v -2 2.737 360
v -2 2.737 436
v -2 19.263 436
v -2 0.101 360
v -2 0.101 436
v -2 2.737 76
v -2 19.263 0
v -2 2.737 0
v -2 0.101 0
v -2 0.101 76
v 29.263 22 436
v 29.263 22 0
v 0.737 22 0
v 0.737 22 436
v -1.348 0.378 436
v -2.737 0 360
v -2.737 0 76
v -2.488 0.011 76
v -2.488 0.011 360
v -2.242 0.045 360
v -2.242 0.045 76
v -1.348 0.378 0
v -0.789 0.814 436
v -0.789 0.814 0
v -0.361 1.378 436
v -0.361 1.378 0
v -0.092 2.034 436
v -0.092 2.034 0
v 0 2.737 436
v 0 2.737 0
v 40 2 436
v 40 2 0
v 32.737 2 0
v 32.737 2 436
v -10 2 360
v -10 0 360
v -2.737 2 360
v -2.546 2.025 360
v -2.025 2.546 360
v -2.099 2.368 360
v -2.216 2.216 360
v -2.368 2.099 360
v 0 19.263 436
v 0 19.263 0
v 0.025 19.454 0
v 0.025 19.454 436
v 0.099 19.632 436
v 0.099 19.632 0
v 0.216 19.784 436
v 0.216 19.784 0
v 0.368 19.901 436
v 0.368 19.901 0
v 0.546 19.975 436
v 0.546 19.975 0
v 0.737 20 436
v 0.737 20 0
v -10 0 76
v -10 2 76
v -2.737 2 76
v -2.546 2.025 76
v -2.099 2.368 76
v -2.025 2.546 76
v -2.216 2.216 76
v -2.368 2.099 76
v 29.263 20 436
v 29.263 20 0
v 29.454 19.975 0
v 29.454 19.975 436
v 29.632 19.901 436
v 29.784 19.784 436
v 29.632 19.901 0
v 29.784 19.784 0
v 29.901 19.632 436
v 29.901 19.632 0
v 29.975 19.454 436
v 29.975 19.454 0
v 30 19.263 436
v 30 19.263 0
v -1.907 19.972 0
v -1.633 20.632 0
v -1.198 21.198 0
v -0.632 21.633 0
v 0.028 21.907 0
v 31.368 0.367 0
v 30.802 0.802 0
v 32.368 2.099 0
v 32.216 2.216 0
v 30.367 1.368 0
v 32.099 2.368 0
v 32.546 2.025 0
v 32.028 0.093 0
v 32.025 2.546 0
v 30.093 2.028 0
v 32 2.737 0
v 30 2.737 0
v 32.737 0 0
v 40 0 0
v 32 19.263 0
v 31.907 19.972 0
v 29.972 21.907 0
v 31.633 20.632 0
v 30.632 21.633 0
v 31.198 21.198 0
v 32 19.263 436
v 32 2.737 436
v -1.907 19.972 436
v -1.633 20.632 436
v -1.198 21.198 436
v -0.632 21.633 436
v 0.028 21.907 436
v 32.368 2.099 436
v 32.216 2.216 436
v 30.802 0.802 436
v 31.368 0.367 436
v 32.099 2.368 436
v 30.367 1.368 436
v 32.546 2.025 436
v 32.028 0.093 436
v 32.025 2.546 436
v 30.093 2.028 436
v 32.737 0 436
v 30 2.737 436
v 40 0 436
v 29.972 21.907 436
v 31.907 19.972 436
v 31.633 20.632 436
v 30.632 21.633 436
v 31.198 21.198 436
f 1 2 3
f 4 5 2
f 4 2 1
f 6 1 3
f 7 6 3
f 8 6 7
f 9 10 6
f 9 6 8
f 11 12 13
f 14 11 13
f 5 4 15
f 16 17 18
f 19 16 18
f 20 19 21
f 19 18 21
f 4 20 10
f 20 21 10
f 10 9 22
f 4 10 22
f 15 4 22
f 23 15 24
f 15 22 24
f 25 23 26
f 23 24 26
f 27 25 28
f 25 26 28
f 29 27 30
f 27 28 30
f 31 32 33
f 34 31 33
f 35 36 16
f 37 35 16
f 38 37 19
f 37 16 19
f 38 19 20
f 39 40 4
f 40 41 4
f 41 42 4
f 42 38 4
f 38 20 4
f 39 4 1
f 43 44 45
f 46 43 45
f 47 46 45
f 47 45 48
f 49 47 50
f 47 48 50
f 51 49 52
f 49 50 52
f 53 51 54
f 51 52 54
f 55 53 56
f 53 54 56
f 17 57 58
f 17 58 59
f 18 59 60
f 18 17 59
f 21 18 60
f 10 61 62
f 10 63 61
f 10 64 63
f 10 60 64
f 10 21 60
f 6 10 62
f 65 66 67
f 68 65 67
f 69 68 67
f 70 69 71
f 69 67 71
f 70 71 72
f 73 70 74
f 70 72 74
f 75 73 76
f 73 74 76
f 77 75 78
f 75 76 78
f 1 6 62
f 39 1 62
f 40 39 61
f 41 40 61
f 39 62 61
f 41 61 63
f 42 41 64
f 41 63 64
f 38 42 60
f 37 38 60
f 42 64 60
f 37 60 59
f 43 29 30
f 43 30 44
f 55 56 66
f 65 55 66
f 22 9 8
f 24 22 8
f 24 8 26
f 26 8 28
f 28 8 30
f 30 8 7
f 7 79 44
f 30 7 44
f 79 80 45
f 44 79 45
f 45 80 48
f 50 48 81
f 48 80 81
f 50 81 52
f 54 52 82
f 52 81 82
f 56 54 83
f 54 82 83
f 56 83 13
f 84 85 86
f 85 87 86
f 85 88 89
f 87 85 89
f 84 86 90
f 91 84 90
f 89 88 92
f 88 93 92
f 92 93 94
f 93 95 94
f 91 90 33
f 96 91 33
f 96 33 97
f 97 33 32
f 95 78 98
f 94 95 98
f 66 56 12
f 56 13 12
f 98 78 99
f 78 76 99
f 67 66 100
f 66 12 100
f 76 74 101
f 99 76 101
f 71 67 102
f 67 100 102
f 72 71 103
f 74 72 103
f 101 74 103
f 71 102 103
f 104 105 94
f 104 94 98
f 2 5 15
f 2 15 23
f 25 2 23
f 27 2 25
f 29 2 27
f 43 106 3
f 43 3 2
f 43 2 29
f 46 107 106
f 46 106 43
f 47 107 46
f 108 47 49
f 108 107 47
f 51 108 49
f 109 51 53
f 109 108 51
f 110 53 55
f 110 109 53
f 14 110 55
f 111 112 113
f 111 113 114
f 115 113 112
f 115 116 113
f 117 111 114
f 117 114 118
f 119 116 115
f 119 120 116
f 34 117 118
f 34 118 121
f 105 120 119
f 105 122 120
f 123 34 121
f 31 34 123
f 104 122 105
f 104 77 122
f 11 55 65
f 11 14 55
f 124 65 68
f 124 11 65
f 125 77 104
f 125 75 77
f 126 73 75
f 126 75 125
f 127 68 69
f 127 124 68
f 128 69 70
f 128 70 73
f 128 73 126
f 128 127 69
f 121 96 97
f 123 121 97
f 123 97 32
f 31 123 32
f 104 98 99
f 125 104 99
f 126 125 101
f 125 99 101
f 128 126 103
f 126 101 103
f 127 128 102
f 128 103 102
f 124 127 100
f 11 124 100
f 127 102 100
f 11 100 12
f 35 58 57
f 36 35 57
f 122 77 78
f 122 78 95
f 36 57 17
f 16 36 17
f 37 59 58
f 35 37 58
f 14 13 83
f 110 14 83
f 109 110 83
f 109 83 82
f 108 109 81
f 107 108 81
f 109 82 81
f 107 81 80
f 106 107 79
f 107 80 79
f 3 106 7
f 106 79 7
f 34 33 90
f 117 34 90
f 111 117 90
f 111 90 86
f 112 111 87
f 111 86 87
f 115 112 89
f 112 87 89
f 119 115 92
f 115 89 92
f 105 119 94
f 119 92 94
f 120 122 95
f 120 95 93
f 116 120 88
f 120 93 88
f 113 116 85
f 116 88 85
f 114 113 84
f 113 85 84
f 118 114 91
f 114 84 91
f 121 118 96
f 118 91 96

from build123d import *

# Parameters (mm, degrees)
SM_BASE_FLANGE_1_DEPTH   = 436
CUT_EXTRUDE_1_DEPTH      = 10
CUT_EXTRUDE_1_DEPTH_BACK = 10
SKETCH_2_W               = 12.842994449
SKETCH_2_H               = 79.921875175
SKETCH_2_W_2             = 14.142108975
SKETCH_2_H_2             = 88.32377597


# Sheet-metal steps are written as plain solids
with BuildPart() as part:
    # Sketch 1 → 基体-法兰1 (new body)
    with BuildSketch(Plane.XY):
        with BuildLine():
            Line((-10, 0), (-2.7366, 0))
            ThreePointArc((-2.7366, 0), (-0.801531583, 0.801531583), (0, 2.7366))
            Line((0, 2.7366), (0, 19.2634))
            ThreePointArc((0, 19.2634), (0.215745145, 19.784254855), (0.7366, 20))
            Line((0.7366, 20), (29.2634, 20))
            ThreePointArc((29.2634, 20), (29.784254855, 19.784254855), (30, 19.2634))
            Line((30, 19.2634), (30, 2.7366))
            ThreePointArc((30, 2.7366), (30.801531583, 0.801531583), (32.7366, 0))
            Line((32.7366, 0), (40, 0))
            Line((40, 0), (40, 2))
            Line((40, 2), (32.7366, 2))
            ThreePointArc((32.7366, 2), (32.215745145, 2.215745145), (32, 2.7366))
            Line((32, 2.7366), (32, 19.2634))
            ThreePointArc((32, 19.2634), (31.198468417, 21.198468417), (29.2634, 22))
            Line((29.2634, 22), (0.7366, 22))
            ThreePointArc((0.7366, 22), (-1.198468417, 21.198468417), (-2, 19.2634))
            Line((-2, 19.2634), (-2, 2.7366))
            ThreePointArc((-2, 2.7366), (-2.215745145, 2.215745145), (-2.7366, 2))
            Line((-2.7366, 2), (-10, 2))
            Line((-10, 2), (-10, 0))
        make_face()
    extrude(amount=SM_BASE_FLANGE_1_DEPTH)

    # Sketch 2 → 切除-拉伸1 (cut, two sides: drawn at the far end of the back side and taken through both)
    with BuildSketch(Plane(origin=(0, 2, 0), x_dir=(1, 0, 0), z_dir=(0, 1, 0)).offset(-CUT_EXTRUDE_1_DEPTH_BACK)):
        with Locations((-8.421497225, -36.039062413)):
            Rectangle(SKETCH_2_W, SKETCH_2_H)
        with Locations((-9.071054487, -404.161887985)):
            Rectangle(SKETCH_2_W_2, SKETCH_2_H_2)
    extrude(amount=CUT_EXTRUDE_1_DEPTH + CUT_EXTRUDE_1_DEPTH_BACK, mode=Mode.SUBTRACT)


solid = part.part
